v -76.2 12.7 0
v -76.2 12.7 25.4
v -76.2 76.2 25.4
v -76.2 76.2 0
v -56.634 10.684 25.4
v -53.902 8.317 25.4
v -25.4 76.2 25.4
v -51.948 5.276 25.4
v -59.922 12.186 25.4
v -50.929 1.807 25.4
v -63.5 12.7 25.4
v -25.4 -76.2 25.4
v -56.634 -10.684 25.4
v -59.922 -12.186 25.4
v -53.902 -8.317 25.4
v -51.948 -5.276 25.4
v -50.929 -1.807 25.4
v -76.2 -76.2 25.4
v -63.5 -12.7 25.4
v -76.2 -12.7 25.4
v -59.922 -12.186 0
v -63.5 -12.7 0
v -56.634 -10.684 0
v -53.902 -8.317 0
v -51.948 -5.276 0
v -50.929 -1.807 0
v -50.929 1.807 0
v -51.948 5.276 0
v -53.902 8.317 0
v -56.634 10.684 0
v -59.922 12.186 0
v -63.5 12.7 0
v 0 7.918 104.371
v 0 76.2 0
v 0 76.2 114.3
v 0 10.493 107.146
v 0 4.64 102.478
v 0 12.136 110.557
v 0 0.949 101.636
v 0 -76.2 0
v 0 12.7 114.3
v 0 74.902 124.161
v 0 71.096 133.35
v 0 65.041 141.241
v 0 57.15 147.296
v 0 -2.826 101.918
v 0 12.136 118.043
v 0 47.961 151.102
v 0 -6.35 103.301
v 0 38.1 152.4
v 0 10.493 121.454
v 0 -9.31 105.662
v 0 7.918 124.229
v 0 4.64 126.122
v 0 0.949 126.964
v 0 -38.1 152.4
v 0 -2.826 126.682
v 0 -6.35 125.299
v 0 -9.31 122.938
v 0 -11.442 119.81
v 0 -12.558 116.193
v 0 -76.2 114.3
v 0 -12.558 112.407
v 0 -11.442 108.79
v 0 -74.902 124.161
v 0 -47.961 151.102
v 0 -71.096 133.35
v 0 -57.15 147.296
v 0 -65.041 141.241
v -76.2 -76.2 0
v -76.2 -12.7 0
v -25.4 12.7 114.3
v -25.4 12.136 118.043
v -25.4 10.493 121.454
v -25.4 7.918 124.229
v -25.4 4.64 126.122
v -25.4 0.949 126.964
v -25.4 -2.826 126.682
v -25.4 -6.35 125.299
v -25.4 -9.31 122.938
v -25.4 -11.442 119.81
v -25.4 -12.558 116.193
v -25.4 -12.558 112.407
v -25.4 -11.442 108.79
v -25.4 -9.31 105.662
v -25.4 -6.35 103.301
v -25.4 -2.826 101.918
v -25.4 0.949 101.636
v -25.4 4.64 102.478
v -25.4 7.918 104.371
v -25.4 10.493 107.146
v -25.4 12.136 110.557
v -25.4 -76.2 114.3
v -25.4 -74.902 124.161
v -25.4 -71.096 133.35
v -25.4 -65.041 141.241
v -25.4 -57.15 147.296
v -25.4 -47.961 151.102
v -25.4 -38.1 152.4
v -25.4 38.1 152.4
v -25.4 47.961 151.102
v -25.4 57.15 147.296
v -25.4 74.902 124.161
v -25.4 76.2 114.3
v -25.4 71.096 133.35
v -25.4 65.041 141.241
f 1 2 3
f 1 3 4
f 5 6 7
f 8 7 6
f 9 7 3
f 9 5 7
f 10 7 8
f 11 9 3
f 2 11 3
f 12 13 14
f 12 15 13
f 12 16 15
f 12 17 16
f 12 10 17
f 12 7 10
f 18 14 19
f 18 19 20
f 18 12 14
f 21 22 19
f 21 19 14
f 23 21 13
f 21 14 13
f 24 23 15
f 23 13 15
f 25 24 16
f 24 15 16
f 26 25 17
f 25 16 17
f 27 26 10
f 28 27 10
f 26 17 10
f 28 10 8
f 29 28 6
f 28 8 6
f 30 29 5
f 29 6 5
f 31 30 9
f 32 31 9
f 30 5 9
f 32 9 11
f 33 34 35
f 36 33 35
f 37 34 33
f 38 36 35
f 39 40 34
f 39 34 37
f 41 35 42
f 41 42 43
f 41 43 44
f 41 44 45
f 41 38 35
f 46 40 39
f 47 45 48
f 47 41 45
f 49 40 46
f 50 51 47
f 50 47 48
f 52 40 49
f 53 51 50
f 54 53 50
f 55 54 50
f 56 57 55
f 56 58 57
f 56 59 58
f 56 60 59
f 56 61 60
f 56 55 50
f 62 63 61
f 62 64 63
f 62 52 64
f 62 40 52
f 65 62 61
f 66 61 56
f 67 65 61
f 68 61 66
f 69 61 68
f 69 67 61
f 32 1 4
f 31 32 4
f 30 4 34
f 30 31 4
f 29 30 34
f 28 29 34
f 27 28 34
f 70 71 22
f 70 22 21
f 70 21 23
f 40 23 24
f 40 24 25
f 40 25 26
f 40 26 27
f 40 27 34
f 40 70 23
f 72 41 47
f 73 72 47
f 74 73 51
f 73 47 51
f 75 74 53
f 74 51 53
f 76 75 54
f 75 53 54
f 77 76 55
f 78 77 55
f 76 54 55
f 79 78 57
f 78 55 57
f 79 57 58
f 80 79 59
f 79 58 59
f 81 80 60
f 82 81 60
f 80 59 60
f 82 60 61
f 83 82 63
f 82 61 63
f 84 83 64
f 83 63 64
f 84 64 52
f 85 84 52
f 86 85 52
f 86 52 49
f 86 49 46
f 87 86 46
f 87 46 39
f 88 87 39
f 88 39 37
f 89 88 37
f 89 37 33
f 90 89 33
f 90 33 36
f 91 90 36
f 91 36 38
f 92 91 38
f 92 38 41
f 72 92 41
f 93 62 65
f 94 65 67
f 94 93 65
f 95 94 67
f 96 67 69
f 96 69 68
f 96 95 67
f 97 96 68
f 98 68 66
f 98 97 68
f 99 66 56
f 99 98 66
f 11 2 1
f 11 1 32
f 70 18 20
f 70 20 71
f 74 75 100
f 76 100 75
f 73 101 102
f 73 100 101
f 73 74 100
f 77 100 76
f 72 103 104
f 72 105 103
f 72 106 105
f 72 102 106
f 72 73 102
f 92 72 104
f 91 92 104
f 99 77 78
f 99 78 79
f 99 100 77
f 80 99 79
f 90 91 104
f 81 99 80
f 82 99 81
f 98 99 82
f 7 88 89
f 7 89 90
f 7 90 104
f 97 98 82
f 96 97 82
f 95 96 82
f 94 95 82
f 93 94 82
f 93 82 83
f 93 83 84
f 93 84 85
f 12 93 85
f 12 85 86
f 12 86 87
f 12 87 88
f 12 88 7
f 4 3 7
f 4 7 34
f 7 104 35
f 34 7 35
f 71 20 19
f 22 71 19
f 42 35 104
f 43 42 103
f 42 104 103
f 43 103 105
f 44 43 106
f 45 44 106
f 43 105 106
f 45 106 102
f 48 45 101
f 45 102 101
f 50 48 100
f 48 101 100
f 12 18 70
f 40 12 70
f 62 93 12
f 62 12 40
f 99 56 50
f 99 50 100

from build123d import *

# Parameters (mm, degrees)
F1_DEPTH = 76.2
F2_R     = 12.7
F3_DEPTH = 76.201
F4_W     = 12.7
F4_H     = 25.4
F5_DEPTH = 25.401
F6_R     = 38.1


with BuildPart() as f1:
    # F0 (on Front) → F1 (new body, symmetric)
    with BuildSketch(Plane.XZ):
        Polygon((-76.2, 25.4), (-76.2, 0), (0, 0), (0, 152.4), (-25.4, 152.4), (-25.4, 25.4), align=None)
    extrude(amount=F1_DEPTH, both=True)

    # F2 (on face) → F3 (cut, through all)
    with BuildSketch(Plane.YZ):
        with Locations((0, 114.3)):
            Circle(F2_R)
    extrude(amount=-F3_DEPTH, mode=Mode.SUBTRACT)

    # F4 (on face) → F5 (cut, through all)
    with BuildSketch(Plane.XY.offset(25.4)):
        with Locations((-69.85, 0)):
            Rectangle(F4_W, F4_H)
        with BuildLine():
            ThreePointArc((-63.5, -12.7), (-50.8, 0), (-63.5, 12.7))
            Line((-63.5, 12.7), (-63.5, -12.7))
        make_face()
    extrude(amount=-F5_DEPTH, mode=Mode.SUBTRACT)

    # F6
    f6_edges = [f1.edges().sort_by_distance(p)[0] for p in [
        (-12.7, 76.2, 152.4),
        (-12.7, -76.2, 152.4),
    ]]
    fillet(f6_edges, radius=F6_R)


solid = f1.part
